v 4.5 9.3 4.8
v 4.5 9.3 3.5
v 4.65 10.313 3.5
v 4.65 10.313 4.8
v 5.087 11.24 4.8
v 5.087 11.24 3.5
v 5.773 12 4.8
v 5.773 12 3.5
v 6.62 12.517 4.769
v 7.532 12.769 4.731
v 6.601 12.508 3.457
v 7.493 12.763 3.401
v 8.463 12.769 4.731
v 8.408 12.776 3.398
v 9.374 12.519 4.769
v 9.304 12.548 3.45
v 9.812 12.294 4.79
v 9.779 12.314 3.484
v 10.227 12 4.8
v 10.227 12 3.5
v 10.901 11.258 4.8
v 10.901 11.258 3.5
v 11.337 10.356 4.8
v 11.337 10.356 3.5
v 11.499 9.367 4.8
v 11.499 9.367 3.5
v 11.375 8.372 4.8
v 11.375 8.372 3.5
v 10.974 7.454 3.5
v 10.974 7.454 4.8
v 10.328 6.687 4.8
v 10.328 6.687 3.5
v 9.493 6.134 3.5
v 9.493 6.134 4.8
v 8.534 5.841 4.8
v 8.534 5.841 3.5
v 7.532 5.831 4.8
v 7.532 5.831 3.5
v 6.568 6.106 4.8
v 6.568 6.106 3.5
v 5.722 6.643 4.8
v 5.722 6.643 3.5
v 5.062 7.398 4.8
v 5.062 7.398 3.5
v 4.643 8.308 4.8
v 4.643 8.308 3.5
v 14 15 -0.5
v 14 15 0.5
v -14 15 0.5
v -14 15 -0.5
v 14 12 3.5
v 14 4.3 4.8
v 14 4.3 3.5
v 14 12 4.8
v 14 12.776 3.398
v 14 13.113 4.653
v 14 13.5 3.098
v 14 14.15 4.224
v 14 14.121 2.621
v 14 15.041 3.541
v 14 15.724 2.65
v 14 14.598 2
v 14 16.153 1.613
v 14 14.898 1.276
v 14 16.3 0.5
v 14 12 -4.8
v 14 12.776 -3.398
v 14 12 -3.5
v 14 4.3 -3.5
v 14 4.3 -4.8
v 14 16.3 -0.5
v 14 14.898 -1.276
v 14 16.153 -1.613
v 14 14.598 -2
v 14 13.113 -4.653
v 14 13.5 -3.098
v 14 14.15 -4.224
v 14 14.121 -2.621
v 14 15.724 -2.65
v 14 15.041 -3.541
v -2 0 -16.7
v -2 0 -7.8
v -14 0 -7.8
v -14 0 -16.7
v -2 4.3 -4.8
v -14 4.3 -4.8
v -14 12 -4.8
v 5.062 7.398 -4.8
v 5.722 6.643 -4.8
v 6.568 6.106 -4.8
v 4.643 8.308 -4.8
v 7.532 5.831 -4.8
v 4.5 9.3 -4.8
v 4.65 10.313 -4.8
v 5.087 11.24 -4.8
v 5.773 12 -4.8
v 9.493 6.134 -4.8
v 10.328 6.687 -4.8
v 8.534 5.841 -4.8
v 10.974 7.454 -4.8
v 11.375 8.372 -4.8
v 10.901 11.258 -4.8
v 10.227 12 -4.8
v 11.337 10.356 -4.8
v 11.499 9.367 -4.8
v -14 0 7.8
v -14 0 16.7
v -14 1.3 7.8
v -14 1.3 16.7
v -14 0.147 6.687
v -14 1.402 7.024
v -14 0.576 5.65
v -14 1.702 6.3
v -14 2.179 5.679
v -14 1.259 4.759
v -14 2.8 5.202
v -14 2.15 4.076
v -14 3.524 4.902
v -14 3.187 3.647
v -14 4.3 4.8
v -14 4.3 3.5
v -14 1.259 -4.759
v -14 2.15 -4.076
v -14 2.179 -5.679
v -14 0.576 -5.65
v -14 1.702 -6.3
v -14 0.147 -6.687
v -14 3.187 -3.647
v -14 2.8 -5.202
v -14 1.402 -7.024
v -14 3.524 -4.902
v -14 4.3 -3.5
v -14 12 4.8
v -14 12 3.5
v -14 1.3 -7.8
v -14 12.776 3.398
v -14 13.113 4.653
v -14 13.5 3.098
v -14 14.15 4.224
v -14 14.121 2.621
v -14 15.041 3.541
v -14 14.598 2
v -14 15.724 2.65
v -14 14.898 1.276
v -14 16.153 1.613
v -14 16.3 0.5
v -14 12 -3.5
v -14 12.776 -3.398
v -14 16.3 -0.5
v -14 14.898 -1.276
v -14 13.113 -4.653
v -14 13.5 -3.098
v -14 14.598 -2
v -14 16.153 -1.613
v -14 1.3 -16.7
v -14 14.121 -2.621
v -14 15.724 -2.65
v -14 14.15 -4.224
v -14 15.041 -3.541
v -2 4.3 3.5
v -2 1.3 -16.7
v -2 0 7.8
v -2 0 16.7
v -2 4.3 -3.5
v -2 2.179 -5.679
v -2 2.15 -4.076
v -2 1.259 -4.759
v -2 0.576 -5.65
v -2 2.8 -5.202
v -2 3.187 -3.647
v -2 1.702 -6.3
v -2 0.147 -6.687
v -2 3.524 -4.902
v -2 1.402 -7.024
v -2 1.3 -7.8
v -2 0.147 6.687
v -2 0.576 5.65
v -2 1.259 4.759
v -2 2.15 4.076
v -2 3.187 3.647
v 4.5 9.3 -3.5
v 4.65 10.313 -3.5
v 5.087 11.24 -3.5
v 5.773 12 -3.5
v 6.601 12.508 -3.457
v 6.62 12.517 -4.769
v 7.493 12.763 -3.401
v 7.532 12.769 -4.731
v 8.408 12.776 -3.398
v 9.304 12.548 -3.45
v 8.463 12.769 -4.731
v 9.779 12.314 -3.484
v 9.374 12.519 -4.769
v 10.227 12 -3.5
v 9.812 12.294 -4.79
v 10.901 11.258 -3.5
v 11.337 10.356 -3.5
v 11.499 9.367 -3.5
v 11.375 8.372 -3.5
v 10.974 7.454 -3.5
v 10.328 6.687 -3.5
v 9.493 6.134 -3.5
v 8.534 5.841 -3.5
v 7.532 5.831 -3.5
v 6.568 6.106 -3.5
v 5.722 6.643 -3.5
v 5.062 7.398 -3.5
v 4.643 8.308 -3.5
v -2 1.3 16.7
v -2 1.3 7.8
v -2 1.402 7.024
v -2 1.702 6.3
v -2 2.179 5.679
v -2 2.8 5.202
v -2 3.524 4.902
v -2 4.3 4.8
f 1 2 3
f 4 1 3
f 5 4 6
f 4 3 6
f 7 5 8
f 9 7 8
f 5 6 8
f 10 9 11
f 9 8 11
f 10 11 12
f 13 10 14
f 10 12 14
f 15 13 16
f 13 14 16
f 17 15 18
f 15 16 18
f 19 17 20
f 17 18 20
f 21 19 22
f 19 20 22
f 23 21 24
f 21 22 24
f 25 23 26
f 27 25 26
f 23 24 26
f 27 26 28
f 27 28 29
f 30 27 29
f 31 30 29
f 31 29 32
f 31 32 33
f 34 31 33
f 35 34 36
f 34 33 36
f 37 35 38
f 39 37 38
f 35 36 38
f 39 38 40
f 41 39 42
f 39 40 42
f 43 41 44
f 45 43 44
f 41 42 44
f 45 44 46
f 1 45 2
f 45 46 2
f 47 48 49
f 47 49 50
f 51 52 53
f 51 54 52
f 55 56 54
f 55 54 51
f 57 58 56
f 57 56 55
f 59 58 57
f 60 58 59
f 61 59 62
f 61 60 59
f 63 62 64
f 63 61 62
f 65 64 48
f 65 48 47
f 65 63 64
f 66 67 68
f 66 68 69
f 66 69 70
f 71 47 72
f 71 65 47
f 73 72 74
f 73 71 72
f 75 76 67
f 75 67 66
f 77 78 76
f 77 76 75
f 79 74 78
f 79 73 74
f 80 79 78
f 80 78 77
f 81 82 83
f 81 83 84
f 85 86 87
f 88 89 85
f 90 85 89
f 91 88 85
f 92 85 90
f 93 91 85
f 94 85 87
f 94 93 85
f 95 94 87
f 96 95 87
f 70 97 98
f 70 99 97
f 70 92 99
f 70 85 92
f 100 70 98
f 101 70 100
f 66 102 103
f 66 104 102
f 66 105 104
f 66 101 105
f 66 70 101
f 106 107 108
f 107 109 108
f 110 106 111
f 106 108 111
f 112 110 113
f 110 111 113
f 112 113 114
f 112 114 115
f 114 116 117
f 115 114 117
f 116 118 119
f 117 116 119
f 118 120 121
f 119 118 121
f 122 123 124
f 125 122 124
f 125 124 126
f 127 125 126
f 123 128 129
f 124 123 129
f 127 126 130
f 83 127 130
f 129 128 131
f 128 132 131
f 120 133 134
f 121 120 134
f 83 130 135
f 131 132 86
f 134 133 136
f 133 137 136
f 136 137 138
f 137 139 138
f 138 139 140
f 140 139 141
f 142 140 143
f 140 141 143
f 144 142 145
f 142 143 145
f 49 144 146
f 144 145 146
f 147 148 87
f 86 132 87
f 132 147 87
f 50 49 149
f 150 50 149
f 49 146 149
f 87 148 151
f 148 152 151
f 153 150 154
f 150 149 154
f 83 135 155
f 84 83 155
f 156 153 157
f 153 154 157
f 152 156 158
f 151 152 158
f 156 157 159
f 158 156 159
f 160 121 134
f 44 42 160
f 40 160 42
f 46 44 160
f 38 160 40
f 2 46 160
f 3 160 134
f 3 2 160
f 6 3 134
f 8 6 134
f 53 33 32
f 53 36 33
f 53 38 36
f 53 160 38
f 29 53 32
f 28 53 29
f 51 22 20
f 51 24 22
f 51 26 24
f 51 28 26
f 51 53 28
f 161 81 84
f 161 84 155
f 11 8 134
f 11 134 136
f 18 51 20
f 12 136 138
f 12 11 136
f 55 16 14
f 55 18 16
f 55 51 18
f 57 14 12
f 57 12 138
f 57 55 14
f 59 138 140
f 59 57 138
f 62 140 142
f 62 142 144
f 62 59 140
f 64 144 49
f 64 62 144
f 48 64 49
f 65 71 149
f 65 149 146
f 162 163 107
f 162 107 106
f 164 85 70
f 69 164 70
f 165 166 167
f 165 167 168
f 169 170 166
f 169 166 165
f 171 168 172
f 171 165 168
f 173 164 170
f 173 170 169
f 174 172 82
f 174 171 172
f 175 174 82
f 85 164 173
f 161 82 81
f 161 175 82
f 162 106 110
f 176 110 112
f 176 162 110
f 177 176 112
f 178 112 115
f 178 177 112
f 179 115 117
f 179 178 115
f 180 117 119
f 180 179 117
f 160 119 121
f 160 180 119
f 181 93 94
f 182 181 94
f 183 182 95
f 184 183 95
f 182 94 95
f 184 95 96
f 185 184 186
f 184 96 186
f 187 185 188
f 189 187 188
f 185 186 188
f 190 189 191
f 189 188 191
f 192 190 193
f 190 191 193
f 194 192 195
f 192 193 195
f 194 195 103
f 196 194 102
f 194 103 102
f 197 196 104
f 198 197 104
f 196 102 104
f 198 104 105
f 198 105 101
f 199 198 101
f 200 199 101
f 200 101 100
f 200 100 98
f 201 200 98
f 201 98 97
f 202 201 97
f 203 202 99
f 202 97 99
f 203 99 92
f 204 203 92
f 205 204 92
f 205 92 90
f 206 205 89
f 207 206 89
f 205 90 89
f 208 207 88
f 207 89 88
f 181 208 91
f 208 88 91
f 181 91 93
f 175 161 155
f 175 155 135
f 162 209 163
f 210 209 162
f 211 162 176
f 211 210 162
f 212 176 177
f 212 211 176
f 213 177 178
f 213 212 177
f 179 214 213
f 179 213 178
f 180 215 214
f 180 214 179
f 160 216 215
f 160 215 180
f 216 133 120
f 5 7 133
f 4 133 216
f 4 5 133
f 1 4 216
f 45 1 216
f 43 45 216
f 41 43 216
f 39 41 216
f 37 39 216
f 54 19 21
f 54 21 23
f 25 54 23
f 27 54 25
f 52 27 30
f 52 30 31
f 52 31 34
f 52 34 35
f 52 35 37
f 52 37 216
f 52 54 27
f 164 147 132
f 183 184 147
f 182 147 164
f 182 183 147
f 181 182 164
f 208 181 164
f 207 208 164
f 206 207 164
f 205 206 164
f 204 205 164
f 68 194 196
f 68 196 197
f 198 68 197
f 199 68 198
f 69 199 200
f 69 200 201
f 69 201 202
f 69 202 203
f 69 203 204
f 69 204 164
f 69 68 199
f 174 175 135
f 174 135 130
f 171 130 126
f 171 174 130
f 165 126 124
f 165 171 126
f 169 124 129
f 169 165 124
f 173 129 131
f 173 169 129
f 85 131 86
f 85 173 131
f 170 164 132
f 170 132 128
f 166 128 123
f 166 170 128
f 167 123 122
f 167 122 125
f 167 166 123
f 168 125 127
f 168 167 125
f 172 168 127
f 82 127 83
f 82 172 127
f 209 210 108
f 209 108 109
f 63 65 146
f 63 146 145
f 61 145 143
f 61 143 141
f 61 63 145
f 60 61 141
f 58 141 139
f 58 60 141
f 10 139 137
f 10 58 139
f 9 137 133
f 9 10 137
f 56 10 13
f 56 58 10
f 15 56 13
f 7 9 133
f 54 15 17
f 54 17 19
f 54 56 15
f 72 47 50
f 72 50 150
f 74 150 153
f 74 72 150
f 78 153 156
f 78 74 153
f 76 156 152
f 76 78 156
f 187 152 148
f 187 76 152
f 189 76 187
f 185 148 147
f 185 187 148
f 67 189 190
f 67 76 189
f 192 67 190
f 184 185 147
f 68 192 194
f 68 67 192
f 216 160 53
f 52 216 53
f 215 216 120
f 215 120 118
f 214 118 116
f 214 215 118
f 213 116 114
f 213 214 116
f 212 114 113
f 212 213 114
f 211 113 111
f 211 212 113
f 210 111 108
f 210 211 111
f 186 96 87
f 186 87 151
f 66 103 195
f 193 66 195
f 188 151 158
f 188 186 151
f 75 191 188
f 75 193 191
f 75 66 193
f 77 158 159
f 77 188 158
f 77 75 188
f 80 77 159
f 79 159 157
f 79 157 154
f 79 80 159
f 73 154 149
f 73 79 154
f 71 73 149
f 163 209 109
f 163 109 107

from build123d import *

# Parameters (mm, degrees)
EXTRUDE_1_DEPTH       = 14
CUT_EXTRUDE_START     = 3
SKETCH_3_W            = 16
SKETCH_3_H            = 33.4
CUT_EXTRUDE_1_DEPTH   = 30.455434224
HOLE_WIZARD_7_0_7_1_D = 7


with BuildPart() as part:
    # 草图1 → 拉伸-薄壁1 (new, symmetric)
    with BuildSketch(Plane(origin=(0, 0, 0), x_dir=(0, 0, -1), z_dir=(1, 0, 0))):
        with BuildLine():
            Line((-16.7, 0), (-7.8, 0))
            ThreePointArc((-7.8, 0), (-4.759440841, 1.259440841), (-3.5, 4.3))
            Line((-3.5, 4.3), (-3.5, 12))
            ThreePointArc((-3.5, 12), (-2.621320344, 14.121320344), (-0.5, 15))
            Line((-0.5, 15), (0.5, 15))
            ThreePointArc((0.5, 15), (2.621320344, 14.121320344), (3.5, 12))
            Line((3.5, 12), (3.5, 4.3))
            ThreePointArc((3.5, 4.3), (4.759440841, 1.259440841), (7.8, 0))
            Line((7.8, 0), (16.7, 0))
            Line((16.7, 0), (16.7, 1.3))
            Line((16.7, 1.3), (7.8, 1.3))
            ThreePointArc((7.8, 1.3), (5.678679656, 2.178679656), (4.8, 4.3))
            Line((4.8, 4.3), (4.8, 12))
            ThreePointArc((4.8, 12), (3.540559159, 15.040559159), (0.5, 16.3))
            Line((0.5, 16.3), (-0.5, 16.3))
            ThreePointArc((-0.5, 16.3), (-3.540559159, 15.040559159), (-4.8, 12))
            Line((-4.8, 12), (-4.8, 4.3))
            ThreePointArc((-4.8, 4.3), (-5.678679656, 2.178679656), (-7.8, 1.3))
            Line((-7.8, 1.3), (-16.7, 1.3))
            Line((-16.7, 1.3), (-16.7, 0))
        make_face()
    extrude(amount=EXTRUDE_1_DEPTH, both=True)

    # 草图3 → 切除-拉伸1 (cut, through all)
    with BuildSketch(Plane(origin=(0, 1.3, 0), x_dir=(1, 0, 0), z_dir=(0, 1, 0)).offset(CUT_EXTRUDE_START)):
        with Locations((6, 0)):
            Rectangle(SKETCH_3_W, SKETCH_3_H)
    extrude(amount=-CUT_EXTRUDE_1_DEPTH, mode=Mode.SUBTRACT)

    # Ø7.0 (7) 直径孔1 (through all)
    with Locations(Plane.XY.offset(4.8)):
        with Locations((8, 9.3)):
            Hole(HOLE_WIZARD_7_0_7_1_D / 2)


solid = part.part
